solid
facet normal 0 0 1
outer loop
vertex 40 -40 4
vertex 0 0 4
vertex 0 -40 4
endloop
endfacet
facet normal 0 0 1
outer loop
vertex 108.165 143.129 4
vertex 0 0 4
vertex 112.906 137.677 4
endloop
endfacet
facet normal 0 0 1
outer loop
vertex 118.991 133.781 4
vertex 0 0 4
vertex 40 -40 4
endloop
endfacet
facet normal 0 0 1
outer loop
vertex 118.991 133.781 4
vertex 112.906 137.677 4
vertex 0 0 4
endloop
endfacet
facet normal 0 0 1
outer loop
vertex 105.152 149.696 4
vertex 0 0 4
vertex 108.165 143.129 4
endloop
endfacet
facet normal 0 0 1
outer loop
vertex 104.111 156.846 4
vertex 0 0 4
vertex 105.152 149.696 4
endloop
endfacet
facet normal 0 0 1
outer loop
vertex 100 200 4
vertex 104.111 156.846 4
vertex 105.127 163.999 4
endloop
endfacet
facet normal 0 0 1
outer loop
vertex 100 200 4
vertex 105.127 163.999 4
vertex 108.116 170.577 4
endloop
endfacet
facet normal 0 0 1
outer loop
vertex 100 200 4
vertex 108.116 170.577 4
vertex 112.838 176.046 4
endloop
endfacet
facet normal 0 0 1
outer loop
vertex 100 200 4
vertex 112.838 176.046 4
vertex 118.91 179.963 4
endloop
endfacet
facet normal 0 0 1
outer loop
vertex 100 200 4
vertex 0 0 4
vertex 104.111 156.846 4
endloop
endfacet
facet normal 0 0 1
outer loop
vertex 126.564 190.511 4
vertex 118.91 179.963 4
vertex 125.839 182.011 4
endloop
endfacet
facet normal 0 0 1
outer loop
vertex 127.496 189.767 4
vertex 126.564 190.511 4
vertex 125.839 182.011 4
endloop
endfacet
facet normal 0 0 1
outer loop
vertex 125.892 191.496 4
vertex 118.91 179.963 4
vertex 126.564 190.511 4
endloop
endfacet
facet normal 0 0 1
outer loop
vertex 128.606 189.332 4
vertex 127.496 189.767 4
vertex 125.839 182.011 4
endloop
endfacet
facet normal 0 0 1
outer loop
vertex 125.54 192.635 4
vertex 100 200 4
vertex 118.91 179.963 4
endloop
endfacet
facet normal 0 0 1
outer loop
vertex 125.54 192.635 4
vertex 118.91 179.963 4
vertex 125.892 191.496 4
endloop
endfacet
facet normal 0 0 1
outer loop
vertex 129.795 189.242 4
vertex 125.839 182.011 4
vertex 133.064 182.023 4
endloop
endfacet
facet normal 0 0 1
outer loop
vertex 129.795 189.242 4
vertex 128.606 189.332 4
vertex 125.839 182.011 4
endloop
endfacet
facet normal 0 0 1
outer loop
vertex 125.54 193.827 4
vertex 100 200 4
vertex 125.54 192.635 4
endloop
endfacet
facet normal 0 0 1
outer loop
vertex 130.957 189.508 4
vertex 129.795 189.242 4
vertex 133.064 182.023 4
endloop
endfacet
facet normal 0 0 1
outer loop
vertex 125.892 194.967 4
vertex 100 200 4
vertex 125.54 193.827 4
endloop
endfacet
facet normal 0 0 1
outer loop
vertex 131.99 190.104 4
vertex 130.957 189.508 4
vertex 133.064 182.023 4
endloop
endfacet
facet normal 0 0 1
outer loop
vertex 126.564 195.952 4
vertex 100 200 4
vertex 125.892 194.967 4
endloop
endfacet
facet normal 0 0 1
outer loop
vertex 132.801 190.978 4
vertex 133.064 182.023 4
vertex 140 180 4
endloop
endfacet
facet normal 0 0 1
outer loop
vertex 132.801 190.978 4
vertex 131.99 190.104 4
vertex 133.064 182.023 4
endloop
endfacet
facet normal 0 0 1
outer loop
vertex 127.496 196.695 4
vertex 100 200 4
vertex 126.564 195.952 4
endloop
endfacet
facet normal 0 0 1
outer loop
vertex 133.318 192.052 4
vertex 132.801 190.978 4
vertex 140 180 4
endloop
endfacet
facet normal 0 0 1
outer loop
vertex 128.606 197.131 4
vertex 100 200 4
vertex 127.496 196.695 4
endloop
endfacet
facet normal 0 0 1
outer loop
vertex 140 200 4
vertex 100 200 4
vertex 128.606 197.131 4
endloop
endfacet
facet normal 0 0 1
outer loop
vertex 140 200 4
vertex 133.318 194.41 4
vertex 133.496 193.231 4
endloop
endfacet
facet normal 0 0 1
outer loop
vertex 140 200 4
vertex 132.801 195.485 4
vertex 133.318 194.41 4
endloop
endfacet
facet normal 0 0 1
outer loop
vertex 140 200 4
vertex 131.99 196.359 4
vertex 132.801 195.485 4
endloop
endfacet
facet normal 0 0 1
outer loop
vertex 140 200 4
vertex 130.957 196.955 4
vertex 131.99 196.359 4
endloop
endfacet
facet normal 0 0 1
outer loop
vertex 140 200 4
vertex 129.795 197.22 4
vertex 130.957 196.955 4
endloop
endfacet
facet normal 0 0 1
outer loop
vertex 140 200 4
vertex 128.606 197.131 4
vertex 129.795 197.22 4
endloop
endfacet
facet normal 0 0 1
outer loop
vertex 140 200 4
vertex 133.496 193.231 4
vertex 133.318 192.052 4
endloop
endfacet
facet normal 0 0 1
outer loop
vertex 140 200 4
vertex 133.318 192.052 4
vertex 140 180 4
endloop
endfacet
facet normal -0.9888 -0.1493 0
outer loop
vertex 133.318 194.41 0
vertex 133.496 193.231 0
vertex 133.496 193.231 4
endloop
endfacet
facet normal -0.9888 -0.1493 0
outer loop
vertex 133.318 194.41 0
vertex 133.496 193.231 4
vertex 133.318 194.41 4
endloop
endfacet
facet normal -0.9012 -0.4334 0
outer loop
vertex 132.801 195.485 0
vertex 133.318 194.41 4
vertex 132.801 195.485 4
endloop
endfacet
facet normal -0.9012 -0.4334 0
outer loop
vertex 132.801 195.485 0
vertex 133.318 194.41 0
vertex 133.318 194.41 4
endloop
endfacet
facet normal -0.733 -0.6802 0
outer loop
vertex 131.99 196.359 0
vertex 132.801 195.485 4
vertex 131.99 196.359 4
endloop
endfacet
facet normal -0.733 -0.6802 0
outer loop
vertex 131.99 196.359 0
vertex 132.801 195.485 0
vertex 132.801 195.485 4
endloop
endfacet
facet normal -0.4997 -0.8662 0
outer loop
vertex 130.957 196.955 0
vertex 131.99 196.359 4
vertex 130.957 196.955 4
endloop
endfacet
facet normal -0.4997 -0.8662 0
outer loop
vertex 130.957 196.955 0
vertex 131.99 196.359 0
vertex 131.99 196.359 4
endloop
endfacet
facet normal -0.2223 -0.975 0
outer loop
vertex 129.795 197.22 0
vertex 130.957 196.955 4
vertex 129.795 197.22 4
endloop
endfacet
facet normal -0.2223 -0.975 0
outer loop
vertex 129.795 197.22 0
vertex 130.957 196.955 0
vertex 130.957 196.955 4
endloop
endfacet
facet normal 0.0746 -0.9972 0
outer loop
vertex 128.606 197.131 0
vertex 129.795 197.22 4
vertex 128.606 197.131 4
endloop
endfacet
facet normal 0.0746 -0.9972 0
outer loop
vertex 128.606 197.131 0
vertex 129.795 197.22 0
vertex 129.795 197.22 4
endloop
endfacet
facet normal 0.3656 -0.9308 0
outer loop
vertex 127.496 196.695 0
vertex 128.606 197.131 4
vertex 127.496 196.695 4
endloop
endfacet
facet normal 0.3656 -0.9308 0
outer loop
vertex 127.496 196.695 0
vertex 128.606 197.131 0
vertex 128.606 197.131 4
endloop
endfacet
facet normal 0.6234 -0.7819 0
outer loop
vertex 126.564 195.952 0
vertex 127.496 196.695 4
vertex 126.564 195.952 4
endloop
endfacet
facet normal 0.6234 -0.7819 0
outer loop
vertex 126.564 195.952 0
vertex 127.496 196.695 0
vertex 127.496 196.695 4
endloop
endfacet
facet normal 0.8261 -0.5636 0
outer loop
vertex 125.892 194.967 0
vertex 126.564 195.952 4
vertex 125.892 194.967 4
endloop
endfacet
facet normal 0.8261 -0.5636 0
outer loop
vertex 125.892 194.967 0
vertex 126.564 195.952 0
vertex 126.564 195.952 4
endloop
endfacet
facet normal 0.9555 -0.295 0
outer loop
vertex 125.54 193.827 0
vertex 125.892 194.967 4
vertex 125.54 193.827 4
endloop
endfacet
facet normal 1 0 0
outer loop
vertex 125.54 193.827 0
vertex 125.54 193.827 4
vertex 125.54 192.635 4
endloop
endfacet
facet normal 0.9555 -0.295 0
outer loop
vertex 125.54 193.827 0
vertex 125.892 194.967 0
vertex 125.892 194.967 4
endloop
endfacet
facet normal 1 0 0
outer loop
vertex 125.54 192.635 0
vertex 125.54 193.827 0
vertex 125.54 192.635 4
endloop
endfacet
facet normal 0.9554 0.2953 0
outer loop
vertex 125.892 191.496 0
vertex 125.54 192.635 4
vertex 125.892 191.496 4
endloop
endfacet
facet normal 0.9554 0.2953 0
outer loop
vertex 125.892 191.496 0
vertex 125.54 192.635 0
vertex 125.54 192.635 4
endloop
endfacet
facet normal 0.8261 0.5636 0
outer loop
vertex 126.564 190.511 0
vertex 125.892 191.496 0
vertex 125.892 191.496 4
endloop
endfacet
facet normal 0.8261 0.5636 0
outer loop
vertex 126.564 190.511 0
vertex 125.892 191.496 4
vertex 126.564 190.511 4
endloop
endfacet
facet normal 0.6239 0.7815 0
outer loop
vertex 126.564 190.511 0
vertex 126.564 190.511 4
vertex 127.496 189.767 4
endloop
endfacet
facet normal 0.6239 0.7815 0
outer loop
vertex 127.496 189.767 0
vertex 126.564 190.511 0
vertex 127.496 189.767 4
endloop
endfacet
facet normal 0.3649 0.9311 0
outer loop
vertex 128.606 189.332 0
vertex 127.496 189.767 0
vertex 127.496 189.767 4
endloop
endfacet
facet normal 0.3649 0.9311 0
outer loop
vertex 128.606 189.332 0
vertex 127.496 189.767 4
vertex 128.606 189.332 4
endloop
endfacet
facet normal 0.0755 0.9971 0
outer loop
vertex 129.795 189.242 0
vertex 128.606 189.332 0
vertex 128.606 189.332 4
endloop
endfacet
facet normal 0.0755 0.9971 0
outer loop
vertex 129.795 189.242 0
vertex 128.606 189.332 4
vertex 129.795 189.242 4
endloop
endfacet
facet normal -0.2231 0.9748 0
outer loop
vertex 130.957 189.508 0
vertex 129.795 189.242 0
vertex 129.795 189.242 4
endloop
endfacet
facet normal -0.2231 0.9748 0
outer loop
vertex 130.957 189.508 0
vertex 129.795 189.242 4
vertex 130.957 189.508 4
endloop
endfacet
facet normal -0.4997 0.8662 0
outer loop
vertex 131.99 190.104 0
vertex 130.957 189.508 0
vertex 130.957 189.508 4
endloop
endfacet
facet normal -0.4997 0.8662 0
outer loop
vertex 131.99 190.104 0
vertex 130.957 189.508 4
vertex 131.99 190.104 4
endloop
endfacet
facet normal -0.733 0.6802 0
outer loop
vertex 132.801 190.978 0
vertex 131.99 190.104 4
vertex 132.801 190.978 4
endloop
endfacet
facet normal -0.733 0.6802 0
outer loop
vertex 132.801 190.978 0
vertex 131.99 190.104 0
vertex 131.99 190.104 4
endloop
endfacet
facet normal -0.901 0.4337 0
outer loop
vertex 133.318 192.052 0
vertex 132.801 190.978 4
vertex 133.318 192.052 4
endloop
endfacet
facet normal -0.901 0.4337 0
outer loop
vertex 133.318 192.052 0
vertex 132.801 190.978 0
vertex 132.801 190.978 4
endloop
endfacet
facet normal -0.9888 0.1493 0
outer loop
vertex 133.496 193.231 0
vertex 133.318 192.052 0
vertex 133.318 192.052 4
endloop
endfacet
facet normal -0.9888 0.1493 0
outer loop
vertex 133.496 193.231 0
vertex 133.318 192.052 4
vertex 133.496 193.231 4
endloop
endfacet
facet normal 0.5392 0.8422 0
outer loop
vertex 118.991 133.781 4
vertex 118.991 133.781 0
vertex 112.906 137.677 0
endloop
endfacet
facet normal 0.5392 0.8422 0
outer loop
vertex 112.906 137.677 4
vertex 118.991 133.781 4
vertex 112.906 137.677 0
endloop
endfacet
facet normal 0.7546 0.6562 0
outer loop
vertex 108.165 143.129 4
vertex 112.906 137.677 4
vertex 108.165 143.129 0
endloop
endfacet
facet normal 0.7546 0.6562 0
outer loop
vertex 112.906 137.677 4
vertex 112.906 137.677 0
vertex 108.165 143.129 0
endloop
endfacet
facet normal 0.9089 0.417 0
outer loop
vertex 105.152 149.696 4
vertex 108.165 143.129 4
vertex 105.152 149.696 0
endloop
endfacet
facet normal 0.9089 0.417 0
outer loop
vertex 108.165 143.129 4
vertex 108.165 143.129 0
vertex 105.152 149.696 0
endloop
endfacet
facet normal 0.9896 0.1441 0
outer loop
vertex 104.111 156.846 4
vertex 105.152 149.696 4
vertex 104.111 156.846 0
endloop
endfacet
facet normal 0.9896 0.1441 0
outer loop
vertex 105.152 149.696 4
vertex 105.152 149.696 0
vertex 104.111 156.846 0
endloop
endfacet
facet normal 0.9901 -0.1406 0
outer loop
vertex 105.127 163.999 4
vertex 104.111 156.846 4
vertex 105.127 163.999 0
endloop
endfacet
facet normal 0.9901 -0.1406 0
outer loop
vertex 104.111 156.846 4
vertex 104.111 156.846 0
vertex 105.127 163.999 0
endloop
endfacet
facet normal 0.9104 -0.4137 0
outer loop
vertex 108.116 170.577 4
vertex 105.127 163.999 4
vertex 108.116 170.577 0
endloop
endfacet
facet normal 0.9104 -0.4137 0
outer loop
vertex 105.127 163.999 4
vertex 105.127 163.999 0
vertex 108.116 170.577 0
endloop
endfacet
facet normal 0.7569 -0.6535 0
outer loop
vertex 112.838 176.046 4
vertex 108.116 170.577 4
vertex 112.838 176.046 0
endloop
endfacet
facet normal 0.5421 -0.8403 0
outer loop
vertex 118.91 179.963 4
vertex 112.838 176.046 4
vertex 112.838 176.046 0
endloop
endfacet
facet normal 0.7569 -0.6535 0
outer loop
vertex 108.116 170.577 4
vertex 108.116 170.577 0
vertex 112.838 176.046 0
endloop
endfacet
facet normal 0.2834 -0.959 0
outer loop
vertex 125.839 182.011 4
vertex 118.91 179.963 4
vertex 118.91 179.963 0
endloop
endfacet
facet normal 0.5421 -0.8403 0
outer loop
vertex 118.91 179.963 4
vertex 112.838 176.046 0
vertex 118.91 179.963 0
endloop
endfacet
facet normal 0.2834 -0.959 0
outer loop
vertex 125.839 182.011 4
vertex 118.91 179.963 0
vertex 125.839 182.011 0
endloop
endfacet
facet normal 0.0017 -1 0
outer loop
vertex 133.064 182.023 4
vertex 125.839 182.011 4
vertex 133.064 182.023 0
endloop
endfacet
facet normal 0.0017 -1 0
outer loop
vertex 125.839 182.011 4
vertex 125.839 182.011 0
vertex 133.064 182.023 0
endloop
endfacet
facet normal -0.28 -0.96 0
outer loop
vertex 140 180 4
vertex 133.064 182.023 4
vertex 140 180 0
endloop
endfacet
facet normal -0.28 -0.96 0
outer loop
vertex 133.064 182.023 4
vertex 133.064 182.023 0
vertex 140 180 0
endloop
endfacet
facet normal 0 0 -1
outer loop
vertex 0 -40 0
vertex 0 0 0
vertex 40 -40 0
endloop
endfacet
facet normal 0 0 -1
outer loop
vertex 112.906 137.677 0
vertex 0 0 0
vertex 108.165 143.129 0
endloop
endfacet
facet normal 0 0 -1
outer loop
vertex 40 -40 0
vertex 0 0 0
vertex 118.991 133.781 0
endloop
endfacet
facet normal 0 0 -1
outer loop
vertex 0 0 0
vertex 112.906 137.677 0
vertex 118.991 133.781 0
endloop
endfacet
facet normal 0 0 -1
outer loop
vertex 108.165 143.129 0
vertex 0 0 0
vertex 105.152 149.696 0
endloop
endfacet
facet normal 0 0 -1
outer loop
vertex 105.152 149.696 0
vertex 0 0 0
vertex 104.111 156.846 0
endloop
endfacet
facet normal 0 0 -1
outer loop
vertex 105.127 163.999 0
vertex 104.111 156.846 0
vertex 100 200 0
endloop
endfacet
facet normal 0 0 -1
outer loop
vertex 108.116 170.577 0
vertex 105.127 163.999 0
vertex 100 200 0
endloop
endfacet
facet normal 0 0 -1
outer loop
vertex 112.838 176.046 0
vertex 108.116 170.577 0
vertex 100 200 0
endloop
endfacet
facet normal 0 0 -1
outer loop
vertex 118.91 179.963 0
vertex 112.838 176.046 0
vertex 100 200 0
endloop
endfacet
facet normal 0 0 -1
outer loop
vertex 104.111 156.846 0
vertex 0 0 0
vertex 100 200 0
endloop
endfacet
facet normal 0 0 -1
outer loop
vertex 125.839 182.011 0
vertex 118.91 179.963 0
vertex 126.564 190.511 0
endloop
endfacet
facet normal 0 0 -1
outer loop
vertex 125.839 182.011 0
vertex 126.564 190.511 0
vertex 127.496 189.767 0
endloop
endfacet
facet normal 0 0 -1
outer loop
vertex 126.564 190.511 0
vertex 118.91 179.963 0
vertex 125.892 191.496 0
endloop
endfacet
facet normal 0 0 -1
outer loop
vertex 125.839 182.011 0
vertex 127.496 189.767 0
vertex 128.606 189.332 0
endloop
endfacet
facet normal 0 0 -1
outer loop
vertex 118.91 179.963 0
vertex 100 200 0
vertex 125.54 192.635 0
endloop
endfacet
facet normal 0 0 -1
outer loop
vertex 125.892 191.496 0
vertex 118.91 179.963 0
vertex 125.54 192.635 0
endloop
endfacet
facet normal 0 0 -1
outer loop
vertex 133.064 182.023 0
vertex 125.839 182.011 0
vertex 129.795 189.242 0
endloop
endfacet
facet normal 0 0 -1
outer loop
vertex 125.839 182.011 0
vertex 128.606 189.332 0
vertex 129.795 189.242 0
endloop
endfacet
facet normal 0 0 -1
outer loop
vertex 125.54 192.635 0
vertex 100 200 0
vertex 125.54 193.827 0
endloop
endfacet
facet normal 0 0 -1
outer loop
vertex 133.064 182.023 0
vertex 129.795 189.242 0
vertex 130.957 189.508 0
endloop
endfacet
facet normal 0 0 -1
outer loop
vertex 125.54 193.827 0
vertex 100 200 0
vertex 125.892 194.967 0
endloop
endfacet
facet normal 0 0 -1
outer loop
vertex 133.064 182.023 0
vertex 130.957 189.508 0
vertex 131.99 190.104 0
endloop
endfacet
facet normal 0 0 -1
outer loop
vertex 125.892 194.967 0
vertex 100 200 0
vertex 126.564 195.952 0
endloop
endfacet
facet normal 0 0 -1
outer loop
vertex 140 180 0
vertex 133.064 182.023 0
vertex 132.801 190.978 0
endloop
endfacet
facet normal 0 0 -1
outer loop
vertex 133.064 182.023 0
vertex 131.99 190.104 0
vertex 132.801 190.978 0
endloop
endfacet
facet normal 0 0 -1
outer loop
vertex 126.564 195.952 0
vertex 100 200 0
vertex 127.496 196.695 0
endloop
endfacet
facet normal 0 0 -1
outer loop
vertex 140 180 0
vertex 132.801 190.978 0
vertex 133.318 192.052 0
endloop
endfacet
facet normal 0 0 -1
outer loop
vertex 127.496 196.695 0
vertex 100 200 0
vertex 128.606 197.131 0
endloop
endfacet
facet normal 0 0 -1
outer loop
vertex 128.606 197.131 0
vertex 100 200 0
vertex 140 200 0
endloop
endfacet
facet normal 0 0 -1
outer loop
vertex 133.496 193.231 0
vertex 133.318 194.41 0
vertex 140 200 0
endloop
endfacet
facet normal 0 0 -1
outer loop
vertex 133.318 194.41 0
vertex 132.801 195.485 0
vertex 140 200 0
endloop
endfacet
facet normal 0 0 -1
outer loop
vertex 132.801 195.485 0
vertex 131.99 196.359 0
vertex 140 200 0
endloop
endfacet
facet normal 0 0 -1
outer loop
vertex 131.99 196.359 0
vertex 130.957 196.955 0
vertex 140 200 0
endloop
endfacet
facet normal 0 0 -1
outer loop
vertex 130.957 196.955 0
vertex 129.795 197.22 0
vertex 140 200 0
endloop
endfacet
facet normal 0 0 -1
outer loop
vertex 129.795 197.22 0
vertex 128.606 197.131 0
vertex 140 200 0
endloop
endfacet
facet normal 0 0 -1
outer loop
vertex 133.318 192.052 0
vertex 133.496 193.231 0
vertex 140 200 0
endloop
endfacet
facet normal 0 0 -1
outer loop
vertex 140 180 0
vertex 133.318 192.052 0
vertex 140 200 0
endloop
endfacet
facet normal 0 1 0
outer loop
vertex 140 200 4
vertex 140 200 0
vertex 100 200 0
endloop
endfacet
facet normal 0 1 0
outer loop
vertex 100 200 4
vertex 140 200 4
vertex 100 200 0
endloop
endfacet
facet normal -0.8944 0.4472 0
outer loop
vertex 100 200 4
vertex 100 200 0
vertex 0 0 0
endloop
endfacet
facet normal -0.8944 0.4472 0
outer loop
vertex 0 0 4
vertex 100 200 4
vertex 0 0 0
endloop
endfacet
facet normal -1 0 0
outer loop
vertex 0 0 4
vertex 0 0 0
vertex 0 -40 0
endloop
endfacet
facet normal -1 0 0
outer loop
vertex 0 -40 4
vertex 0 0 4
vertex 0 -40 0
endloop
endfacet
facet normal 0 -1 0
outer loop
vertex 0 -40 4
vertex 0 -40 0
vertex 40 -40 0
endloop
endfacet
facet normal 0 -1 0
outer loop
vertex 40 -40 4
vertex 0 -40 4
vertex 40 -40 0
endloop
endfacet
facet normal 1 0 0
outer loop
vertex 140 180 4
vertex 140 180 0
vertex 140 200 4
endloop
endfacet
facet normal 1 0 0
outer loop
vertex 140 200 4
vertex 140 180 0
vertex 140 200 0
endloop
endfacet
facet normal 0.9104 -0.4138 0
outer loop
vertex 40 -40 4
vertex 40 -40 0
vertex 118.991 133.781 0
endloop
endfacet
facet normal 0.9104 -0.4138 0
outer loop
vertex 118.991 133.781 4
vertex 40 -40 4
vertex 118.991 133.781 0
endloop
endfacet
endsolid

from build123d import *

# Parameters (mm, degrees)
SKETCH1_R           = 4
BOSS_EXTRUDE1_DEPTH = 4


with BuildPart() as part:
    # Sketch1 → Boss-Extrude1 (new body)
    with BuildSketch(Plane.XY):
        with BuildLine():
            Line((0, 0), (0, -40))
            Line((0, -40), (40, -40))
            Line((40, -40), (118.991479096, 133.781254012))
            ThreePointArc((118.991479096, 133.781254012), (106.386366554, 167.394887458), (140, 180))
            Line((140, 180), (140, 200))
            Line((140, 200), (100, 200))
            Line((100, 200), (0, 0))
        make_face()
        with Locations((129.495739548, 193.231222879)):
            Circle(SKETCH1_R, mode=Mode.SUBTRACT)
    extrude(amount=BOSS_EXTRUDE1_DEPTH)


solid = part.part
